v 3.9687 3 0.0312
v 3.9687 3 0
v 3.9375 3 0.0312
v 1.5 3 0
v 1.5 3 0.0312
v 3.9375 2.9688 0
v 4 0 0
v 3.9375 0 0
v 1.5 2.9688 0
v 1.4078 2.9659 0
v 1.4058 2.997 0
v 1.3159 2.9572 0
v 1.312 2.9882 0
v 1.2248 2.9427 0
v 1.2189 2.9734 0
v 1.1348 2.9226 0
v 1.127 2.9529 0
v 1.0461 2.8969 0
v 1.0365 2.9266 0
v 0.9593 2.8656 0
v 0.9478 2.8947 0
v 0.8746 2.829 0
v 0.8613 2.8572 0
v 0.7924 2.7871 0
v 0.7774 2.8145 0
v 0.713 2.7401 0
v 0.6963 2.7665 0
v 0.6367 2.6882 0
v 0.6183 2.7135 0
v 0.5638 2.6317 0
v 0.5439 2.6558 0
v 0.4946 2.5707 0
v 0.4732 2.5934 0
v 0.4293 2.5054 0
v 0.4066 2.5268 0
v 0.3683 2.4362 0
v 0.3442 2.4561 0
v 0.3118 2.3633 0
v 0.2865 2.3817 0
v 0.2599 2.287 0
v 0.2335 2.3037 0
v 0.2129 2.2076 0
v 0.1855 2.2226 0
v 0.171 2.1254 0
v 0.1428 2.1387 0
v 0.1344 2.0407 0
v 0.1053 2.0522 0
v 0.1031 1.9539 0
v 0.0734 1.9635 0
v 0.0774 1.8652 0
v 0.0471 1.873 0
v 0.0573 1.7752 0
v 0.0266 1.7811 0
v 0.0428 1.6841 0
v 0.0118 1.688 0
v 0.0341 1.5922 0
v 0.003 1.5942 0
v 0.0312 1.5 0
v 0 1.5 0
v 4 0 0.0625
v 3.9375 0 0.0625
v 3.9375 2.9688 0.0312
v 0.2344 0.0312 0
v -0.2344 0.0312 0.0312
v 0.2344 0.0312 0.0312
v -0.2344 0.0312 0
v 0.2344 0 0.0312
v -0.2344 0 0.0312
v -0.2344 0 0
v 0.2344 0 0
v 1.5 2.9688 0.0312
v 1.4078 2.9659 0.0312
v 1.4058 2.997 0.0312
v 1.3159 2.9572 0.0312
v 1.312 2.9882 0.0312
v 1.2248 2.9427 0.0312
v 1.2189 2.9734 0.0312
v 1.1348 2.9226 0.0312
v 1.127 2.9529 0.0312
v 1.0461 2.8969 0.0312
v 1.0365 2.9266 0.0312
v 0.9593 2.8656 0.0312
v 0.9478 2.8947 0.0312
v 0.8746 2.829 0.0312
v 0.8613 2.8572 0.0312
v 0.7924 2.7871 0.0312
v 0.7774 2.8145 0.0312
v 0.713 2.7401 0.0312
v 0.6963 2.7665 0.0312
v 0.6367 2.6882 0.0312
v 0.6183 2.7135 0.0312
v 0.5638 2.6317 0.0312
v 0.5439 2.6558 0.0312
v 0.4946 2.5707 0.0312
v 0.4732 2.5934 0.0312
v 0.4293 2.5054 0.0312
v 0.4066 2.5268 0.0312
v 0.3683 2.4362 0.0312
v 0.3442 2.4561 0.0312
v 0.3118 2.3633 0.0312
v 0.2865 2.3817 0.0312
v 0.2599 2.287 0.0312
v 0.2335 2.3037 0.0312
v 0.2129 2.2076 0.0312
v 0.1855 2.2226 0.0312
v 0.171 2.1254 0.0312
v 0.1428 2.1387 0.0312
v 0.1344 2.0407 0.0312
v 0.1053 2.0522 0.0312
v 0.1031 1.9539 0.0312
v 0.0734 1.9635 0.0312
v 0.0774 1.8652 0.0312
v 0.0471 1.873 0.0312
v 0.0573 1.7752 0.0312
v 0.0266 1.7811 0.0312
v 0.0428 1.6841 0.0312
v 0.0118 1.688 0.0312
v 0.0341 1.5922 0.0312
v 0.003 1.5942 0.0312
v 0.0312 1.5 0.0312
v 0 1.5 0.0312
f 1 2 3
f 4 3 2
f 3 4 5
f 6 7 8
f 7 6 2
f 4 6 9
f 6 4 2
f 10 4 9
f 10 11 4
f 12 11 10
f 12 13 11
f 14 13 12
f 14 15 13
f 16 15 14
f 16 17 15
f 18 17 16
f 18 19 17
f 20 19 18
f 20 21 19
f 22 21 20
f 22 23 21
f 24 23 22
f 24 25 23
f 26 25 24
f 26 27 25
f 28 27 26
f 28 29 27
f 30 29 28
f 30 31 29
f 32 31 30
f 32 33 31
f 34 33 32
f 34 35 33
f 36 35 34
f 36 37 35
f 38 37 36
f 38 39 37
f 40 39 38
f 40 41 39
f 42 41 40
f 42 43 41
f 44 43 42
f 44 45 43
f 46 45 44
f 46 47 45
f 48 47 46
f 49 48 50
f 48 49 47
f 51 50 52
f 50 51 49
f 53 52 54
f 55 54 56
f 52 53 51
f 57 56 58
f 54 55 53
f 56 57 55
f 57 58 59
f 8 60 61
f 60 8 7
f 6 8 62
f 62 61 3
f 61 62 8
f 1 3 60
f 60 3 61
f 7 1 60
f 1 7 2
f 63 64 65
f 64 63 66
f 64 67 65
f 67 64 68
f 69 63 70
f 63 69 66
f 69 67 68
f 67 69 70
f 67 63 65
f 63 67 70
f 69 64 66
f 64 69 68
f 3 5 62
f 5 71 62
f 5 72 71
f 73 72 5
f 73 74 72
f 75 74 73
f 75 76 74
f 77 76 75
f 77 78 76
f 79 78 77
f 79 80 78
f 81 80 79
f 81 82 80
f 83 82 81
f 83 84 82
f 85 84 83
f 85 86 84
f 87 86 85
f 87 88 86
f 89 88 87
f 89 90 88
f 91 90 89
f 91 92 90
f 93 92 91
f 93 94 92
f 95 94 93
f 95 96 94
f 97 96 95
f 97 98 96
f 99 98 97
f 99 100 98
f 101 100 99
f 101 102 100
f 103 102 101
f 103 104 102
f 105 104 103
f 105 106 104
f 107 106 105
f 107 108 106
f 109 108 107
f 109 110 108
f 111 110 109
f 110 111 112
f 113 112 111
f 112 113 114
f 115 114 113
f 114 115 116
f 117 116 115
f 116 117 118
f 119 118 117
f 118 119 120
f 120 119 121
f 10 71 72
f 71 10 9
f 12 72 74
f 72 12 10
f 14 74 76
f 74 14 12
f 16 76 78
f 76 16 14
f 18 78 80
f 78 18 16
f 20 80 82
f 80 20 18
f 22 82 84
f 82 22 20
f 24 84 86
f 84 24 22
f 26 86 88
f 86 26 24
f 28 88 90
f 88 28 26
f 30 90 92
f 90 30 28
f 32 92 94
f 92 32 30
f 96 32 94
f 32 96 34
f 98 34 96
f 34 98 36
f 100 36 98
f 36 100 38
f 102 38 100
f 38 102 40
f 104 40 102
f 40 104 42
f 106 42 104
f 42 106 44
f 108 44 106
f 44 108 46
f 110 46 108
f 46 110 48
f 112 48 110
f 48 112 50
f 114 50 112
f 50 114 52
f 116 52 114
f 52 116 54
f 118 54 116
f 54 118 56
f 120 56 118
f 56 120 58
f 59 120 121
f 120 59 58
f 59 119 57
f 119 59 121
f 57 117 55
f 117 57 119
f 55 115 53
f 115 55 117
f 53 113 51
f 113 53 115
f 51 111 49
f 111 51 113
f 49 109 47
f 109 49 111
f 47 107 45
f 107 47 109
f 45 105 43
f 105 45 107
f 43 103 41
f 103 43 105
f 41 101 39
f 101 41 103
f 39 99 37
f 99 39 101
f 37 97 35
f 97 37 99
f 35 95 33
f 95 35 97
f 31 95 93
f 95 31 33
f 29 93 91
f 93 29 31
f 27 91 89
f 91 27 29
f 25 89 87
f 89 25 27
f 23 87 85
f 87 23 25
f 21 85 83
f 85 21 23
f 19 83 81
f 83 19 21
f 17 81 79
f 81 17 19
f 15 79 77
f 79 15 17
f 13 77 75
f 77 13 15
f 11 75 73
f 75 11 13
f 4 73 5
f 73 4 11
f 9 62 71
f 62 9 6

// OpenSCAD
// file: ../left_tip/tip_arc/MMlib/MMlib/MMlib/circle_strip.scad
//#####################################
// circle_strip
// (c) 2021 - Roie R. Black
//=====================================
$fn = 100;


module circle_strip(r=3, t=0.5) {
  difference() {
    circle(r);
    circle(r-t);
  }
}

circular_strip();
// file: ../left_tip/tip_arc/MMlib/MMlib/circular_arc_strip.scad
//#####################################
// circular_arc_strip
// (c) 2021 - Roie R. Black
//=====================================
$fn = 100;
use <MMlib/circle_strip.scad>


module circular_arc_strip(
    r=3,
    start_angle=0, end_angle=270,
    t=0.5
  ) {
  dang = (end_angle-start_angle)/4;
  a0 = start_angle;
  a1 = a0 + dang;
  a2 = a1 + dang;
  a3 = a2 + dang;
  a4 = a3 + dang;
  pr = r * sqrt(2) + 1;
  intersection() {
    polygon([
      [0,0],
      [pr*cos(a0), pr*sin(a0)],
      [pr*cos(a1), pr*sin(a1)],
      [pr*cos(a2), pr*sin(a2)],
      [pr*cos(a3), pr*sin(a3)],
      [pr*cos(a4), pr*sin(a4)],
      [0,0]
    ]);
    circle_strip(r,t);
  }
}

circular_arc_strip();
// file: ../../constraints.scad
//####################################
// Math-Magik LPP - Design Constraints
// (c) 2021 by Roie R. Black
//====================================

// AMA Rules for event 208
//------------------------------------

max_overall_length = 20;
max_projected_wing_span = 18;
max_bearing_to_rear_hook = 10;
max_wing_chord = 5;
max_stab_span = 12;
max_stab_chord = 4;
max_prop_diameter = 12;
// file: ../left_tip/tip_rib/MMlib/square_spar.scad
//####################################
// square_spar.scad
// (c) 2021 by Roie R. Black
//====================================


module square_spar(length=6,size=1/16) {
  translate([size/2, 0, size/2])
    cube([size,length,size], center=true);
}

square_spar(6,1/16);
// file: ../left_tip/trailing_edge/MMlib/double_taper_spar.scad
//######################################################################
// double_taper_spar.scad - creates a spar tapered on two sides
// (c) 2021 - Roie R. Black
// docs: https://rblack.github.io/math-magik/magik/double_taper_spar.html

module double_taper_spar(l=5, y1=1, y2=0.5, z1=1, z2=0.5, debug=false) {
  // calc taper angles
  yang = atan2(z1-z2,l);
  zang = atan2(y1-y2,l);


  difference() {
    // z taper
    difference() {
      cube([l,y1,z1]);
      translate([0,-y1/2, z1])
        rotate([0,yang,0])
          if (debug) {
            #cube([l+1, 2*y1, z1]);
          } else {
            cube([l+1, 2*y1, z1]);
          }
    // y taper
    translate([0,y1, -z1/2])
      rotate([0,0,-zang])
        if (debug) {
          #cube([l+1, y1, 2*z1]);
        } else {
          cube([l+1, y1, 2*z1]);
        }
    }
  }
}

double_taper_spar();
// file: ../left_tip/leading_edge/MMlib/square_spar.scad
//####################################
// square_spar.scad
// (c) 2021 by Roie R. Black
//====================================


module square_spar(length=6,size=1/16) {
  translate([size/2, 0, size/2])
    cube([size,length,size], center=true);
}

square_spar(6,1/16);
// file: ../left_tip/fin_data.scad
//#####################################
// fin-data.scad
// (c) 2021 by Roie R. Black
//=====================================
include <colors.scad>

fin_span = 2;
fin_chord = 4;
fin_radius = 1.5;
spar_size = 1/32;
fin_color = WOOD_Balsa;

//-------------------------------------
// calculated values

fin_le_length = fin_span - fin_radius - spar_size;
fin_te_length = fin_span -2*spar_size;
// file: ../left_tip/tip_arc/MMlib/circular_arc_spar.scad
//#####################################
// circular_arc_spar
// (c) 2021 - Roie R. Black
//=====================================
$fn = 100;

use <MMlib/circular_arc_strip.scad>


module circular_arc_spar(
    r=3,
    start_angle=0, end_angle=270,
    t=0.5,
    h=0.5
  ) {
  linear_extrude(height=h)
    circular_arc_strip(r,start_angle, end_angle, t);
}

circular_arc_spar();
// file: ../stab_data.scad
//#####################################
// stab.data
// (c) 2021 by Roie R. Black
//=====================================
include <../constraints.scad>

// center section dimensions
center_span = 6;
spar_size = 1/16;
rib_chord = max_stab_chord - 2 * spar_size;
rib_camber = 2;
num_center_ribs = 3;

// tip section dimensions
tip_span = (max_stab_span - center_span)/2;
tip_radius = 1.5;
tip_le_span = tip_span - tip_radius;
tip_rib_chord = max_stab_chord - tip_radius - spar_size;
// file: ../left_tip/tip_rib/tip_rib.scad
//########################################
// tip_rib.scad
// (c) 2021 - Roie R. Black
//****************************************
include <../../stab_data.scad>

use <MMlib/square_spar.scad>

module tip_rib() {
      square_spar(tip_rib_chord, spar_size/2);
}

tip_rib();
// file: ../left_tip/trailing_edge/trailing_edge.scad
//#####################################
// te.scad = wing center section
// (c) 2021 by Roie R. Black
//=====================================
include <../../stab_data.scad>
use <MMlib/double_taper_spar.scad>

s1 = spar_size;
s2 = spar_size/2;


module trailing_edge() {
		double_taper_spar(tip_span,s1,s2,s1,s2);
}

//====================================
// display this shape
trailing_edge();
// file: ../left_tip/leading_edge/leading_edge.scad
//#####################################
// leading_edge.scad = wing center section
// (c) 2021 by Roie R. Black
//=====================================
include <../fin_data.scad>
use <MMlib/square_spar.scad>

module leading_edge() {
		square_spar(fin_le_length,spar_size);
}

//====================================
// display this shape
leading_edge();
// file: ../left_tip/tip_arc/tip_arc.scad
//########################################
// tip_arc.scad
// (c) 2021 - Roie R. Black
//****************************************
include <../../stab_data.scad>

use <MMlib/circular_arc_spar.scad>

module tip_arc(r=tip_radius, size=spar_size/2) {
    circular_arc_spar(r, 180,270, size,size);
}

tip_arc();
// file: ../left_tip/left_tip_pos.scad
//########################################
// arc_pos.scad
// (c) 2021 - Roie R. Black
//****************************************
include <../stab_data.scad>

le_pos = [0,0,0,0,0,-90];
te_pos = [max_stab_chord - spar_size,0,0,0,0,-90];
arc_pos = [tip_radius, -tip_span + tip_radius, 0,0,0,0];
rib1_pos = [tip_rib_chord/2 + tip_radius,-tip_span,0,0,0,90];
// file: ../left_tip/MMlib/position.scad
//#####################################
// position.scad
// (c) 2021 by Roie R. Black
//=====================================

// apply rotation, then translation
module align(d) {
  translate([d[0],d[1],d[2]])
    rotate([d[3],d[4],d[5]]) children();
}

// apply translation only
module position(d) {
  translate([d[0],d[1],d[2]]) children();
}
// file: ../left_tip/colors.scad
// colors.scad
// Credit: David Powell, OpenSCAN Forum



//group ABS_<colorname>
//	discription  common 3d printer ABS filament colors
// actual colours may need some tweaking

ABS_Nature =[0.8,0.8,0.8,0.8];
ABS_White =[0.9,0.9,0.9,1];
ABS_Black =[0.1,0.1,0.1,1];
ABS_Red = [0.7,0,0,1];
ABS_Green = [0,0.7,0,1];
ABS_Blue = [0,0,0.7,1];
ABS_Orange =[0.8,0.4,0,1];
ABS_Purple =[0.7,0,0.7,1];
ABS_Brown =[0.6,0.2,0.2,1];
ABS_Glow_Blue =[0,0,.99,1];
ABS_Flurescence_Green =[0,1,0,1];
ABS_Flurescence_Yellow = [0.9,0.9,0,1];

//group PLA_<colorname>
//	discription  common 3d printer PLA filament colors
// actual colours may need some tweaking

PLA_Nature =[0.8,0.8,0.8,0.8];
PLA_White =[0.9,0.9,0.9,1];
PLA_Black =[0.1,0.1,0.1,1];
PLA_Red = [0.7,0,0,1];
PLA_Green = [0,0.7,0,1];
PLA_Blue = [0,0,0.7,1];
PLA_Orange =[0.8,0.4,0,1];
PLA_Purple =[0.7,0,0.7,1];
PLA_Brown =[0.6,0.2,0.2,1];
PLA_Glow_Blue =[0,0,.99,1];
PLA_Flurescence_Green =[0,1,0,1];
PLA_Flurescence_Yellow = [0.9,0.9,0,1];

//group ANODIZED_<colorname>
//	discription  common aluminium anodized colors
// these don't seem to follow normal color tables as the process
// produces a color change difference to the named color
// dew to base metal
// actual colours may need some tweaking

ANODIZED_Red =[0.7,0,0,1];
ANODIZED_Gold =[0.8,0.8,0.0,1];
ANODIZED_Black =[0.1,0.1,0.1,1];
ANODIZED_Blue =[0,0,0.7,1];
ANODIZED_Green =[0,0.5,0,1];
ANODIZED_Gray =[0.4,0.4,0.4,1];
ANODIZED_Dark_Blue =[0,0.2,0.6,1];
ANODIZED_Lime_Green =[0,0.8,0,1];
ANODIZED_Purple =[0.5,0,0.7,1];		//more blue than purple
ANODIZED_Light_Blue =[0.4,0.4,1,1];
ANODIZED_Pink =[0.7,0,0.7,1];		//more purlpe than pink
ANODIZED_Orange =[0.9,0.5,0,1];
ANODIZED_Scandia_Gold =[0.9,0.6,0.3,1];
ANODIZED_Copper =[0.7,0.5,0,1];		//more brown than copper
ANODIZED_Clear =[0.7,0.7,0.9,1];	//natural aluminium color
ANODIZED_Light_Bronze =[0.4,0.4,0.3,1]; //more silver than bronze
ANODIZED_Gold_Nickel =[0.8,0.8,0.6,1];
ANODIZED_Brush_Nickel =[0.8,0.8,0.7,1];

//group METAL_<typename>
//	discription common metal colors
// colors need tweaking

METAL_Aluminium = [0.7,0.7,0.8,1];
METAL_Brass = [0.88,0.78,0.5,1];
METAL_Copper = [0.9,0.6,0.5,1];
METAL_Steel = [0.9,0.9,0.8,1];
METAL_Stainless = [0.8,0.8,0.7,1];
METAL_Titanium = [0.7,0.7,0.6,1];
METAL_Bronze = [0.9,0.4,0.4,1];
METAL_Gold = [0.9,0.9,0.0,1];
METAL_Silver = [0.8,0.8,0.8,1];
METAL_Iron = [0.6,0.6,0.6,1];

// group WOOD_<typename>
//	discription common wood colors
// probabaly wrong

WOOD_Oak = [0.4,0.2,0.2,1];
WOOD_Birch = [0.8,0.8,0.4,1];
WOOD_Red = [0.7,0.3,0.3,1];
WOOD_pine = [0.8,0.8,0.4,1];
WOOD_Beach = [0.8,0.6,0.3,1];
WOOD_Spruce = [0.8,0.8,0.7,1];
WOOD_Balsa = [0.95,0.86,0.73];

// group GLASS_<color>
//	discription common glass colors
// needs tweaking

GLASS_Clear = [0.8,0.8,0.8,0.2];
GLASS_Red = [0.8,0,0,0.4];
GLASS_Green = [0,0.8,0,.4];
GLASS_Blue = [0,0,0.8,.4];
GLASS_Brown = [0.5,0.3,0.1,.4];

CONCRETE = [210/255, 209/255, 205/255];
// file: ../left_tip/left_tip.scad
//#####################################
// left_tip.scad
// (c) 2021 by Roie R. Black
//=====================================
include <colors.scad>
use <MMlib/position.scad>
include <./left_tip_pos.scad>

use <./tip_arc/tip_arc.scad>
use <./leading_edge/leading_edge.scad>
use <./trailing_edge/trailing_edge.scad>
use <./tip_rib/tip_rib.scad>
use <./tip_arc/tip_arc.scad>
//use <./covering/covering.scad>


module left_tip() {
  color(WOOD_Balsa) {
    align(le_pos) leading_edge();
    align(te_pos) trailing_edge();
    align(arc_pos) tip_arc();
    align(rib1_pos) tip_rib();
  }
  //rotate([180,0,0]) right_tip_covering();
}

//--------------------------------------
// debug display

left_tip();
// main file
//#####################################
// right-tip.scad
// (c) 2021 by Roie R. Black
//=====================================
use <../left_tip/left_tip.scad>

module right_tip() {
  mirror([0,1,0]) left_tip();
}

//--------------------------------------
// debug display

right_tip();
